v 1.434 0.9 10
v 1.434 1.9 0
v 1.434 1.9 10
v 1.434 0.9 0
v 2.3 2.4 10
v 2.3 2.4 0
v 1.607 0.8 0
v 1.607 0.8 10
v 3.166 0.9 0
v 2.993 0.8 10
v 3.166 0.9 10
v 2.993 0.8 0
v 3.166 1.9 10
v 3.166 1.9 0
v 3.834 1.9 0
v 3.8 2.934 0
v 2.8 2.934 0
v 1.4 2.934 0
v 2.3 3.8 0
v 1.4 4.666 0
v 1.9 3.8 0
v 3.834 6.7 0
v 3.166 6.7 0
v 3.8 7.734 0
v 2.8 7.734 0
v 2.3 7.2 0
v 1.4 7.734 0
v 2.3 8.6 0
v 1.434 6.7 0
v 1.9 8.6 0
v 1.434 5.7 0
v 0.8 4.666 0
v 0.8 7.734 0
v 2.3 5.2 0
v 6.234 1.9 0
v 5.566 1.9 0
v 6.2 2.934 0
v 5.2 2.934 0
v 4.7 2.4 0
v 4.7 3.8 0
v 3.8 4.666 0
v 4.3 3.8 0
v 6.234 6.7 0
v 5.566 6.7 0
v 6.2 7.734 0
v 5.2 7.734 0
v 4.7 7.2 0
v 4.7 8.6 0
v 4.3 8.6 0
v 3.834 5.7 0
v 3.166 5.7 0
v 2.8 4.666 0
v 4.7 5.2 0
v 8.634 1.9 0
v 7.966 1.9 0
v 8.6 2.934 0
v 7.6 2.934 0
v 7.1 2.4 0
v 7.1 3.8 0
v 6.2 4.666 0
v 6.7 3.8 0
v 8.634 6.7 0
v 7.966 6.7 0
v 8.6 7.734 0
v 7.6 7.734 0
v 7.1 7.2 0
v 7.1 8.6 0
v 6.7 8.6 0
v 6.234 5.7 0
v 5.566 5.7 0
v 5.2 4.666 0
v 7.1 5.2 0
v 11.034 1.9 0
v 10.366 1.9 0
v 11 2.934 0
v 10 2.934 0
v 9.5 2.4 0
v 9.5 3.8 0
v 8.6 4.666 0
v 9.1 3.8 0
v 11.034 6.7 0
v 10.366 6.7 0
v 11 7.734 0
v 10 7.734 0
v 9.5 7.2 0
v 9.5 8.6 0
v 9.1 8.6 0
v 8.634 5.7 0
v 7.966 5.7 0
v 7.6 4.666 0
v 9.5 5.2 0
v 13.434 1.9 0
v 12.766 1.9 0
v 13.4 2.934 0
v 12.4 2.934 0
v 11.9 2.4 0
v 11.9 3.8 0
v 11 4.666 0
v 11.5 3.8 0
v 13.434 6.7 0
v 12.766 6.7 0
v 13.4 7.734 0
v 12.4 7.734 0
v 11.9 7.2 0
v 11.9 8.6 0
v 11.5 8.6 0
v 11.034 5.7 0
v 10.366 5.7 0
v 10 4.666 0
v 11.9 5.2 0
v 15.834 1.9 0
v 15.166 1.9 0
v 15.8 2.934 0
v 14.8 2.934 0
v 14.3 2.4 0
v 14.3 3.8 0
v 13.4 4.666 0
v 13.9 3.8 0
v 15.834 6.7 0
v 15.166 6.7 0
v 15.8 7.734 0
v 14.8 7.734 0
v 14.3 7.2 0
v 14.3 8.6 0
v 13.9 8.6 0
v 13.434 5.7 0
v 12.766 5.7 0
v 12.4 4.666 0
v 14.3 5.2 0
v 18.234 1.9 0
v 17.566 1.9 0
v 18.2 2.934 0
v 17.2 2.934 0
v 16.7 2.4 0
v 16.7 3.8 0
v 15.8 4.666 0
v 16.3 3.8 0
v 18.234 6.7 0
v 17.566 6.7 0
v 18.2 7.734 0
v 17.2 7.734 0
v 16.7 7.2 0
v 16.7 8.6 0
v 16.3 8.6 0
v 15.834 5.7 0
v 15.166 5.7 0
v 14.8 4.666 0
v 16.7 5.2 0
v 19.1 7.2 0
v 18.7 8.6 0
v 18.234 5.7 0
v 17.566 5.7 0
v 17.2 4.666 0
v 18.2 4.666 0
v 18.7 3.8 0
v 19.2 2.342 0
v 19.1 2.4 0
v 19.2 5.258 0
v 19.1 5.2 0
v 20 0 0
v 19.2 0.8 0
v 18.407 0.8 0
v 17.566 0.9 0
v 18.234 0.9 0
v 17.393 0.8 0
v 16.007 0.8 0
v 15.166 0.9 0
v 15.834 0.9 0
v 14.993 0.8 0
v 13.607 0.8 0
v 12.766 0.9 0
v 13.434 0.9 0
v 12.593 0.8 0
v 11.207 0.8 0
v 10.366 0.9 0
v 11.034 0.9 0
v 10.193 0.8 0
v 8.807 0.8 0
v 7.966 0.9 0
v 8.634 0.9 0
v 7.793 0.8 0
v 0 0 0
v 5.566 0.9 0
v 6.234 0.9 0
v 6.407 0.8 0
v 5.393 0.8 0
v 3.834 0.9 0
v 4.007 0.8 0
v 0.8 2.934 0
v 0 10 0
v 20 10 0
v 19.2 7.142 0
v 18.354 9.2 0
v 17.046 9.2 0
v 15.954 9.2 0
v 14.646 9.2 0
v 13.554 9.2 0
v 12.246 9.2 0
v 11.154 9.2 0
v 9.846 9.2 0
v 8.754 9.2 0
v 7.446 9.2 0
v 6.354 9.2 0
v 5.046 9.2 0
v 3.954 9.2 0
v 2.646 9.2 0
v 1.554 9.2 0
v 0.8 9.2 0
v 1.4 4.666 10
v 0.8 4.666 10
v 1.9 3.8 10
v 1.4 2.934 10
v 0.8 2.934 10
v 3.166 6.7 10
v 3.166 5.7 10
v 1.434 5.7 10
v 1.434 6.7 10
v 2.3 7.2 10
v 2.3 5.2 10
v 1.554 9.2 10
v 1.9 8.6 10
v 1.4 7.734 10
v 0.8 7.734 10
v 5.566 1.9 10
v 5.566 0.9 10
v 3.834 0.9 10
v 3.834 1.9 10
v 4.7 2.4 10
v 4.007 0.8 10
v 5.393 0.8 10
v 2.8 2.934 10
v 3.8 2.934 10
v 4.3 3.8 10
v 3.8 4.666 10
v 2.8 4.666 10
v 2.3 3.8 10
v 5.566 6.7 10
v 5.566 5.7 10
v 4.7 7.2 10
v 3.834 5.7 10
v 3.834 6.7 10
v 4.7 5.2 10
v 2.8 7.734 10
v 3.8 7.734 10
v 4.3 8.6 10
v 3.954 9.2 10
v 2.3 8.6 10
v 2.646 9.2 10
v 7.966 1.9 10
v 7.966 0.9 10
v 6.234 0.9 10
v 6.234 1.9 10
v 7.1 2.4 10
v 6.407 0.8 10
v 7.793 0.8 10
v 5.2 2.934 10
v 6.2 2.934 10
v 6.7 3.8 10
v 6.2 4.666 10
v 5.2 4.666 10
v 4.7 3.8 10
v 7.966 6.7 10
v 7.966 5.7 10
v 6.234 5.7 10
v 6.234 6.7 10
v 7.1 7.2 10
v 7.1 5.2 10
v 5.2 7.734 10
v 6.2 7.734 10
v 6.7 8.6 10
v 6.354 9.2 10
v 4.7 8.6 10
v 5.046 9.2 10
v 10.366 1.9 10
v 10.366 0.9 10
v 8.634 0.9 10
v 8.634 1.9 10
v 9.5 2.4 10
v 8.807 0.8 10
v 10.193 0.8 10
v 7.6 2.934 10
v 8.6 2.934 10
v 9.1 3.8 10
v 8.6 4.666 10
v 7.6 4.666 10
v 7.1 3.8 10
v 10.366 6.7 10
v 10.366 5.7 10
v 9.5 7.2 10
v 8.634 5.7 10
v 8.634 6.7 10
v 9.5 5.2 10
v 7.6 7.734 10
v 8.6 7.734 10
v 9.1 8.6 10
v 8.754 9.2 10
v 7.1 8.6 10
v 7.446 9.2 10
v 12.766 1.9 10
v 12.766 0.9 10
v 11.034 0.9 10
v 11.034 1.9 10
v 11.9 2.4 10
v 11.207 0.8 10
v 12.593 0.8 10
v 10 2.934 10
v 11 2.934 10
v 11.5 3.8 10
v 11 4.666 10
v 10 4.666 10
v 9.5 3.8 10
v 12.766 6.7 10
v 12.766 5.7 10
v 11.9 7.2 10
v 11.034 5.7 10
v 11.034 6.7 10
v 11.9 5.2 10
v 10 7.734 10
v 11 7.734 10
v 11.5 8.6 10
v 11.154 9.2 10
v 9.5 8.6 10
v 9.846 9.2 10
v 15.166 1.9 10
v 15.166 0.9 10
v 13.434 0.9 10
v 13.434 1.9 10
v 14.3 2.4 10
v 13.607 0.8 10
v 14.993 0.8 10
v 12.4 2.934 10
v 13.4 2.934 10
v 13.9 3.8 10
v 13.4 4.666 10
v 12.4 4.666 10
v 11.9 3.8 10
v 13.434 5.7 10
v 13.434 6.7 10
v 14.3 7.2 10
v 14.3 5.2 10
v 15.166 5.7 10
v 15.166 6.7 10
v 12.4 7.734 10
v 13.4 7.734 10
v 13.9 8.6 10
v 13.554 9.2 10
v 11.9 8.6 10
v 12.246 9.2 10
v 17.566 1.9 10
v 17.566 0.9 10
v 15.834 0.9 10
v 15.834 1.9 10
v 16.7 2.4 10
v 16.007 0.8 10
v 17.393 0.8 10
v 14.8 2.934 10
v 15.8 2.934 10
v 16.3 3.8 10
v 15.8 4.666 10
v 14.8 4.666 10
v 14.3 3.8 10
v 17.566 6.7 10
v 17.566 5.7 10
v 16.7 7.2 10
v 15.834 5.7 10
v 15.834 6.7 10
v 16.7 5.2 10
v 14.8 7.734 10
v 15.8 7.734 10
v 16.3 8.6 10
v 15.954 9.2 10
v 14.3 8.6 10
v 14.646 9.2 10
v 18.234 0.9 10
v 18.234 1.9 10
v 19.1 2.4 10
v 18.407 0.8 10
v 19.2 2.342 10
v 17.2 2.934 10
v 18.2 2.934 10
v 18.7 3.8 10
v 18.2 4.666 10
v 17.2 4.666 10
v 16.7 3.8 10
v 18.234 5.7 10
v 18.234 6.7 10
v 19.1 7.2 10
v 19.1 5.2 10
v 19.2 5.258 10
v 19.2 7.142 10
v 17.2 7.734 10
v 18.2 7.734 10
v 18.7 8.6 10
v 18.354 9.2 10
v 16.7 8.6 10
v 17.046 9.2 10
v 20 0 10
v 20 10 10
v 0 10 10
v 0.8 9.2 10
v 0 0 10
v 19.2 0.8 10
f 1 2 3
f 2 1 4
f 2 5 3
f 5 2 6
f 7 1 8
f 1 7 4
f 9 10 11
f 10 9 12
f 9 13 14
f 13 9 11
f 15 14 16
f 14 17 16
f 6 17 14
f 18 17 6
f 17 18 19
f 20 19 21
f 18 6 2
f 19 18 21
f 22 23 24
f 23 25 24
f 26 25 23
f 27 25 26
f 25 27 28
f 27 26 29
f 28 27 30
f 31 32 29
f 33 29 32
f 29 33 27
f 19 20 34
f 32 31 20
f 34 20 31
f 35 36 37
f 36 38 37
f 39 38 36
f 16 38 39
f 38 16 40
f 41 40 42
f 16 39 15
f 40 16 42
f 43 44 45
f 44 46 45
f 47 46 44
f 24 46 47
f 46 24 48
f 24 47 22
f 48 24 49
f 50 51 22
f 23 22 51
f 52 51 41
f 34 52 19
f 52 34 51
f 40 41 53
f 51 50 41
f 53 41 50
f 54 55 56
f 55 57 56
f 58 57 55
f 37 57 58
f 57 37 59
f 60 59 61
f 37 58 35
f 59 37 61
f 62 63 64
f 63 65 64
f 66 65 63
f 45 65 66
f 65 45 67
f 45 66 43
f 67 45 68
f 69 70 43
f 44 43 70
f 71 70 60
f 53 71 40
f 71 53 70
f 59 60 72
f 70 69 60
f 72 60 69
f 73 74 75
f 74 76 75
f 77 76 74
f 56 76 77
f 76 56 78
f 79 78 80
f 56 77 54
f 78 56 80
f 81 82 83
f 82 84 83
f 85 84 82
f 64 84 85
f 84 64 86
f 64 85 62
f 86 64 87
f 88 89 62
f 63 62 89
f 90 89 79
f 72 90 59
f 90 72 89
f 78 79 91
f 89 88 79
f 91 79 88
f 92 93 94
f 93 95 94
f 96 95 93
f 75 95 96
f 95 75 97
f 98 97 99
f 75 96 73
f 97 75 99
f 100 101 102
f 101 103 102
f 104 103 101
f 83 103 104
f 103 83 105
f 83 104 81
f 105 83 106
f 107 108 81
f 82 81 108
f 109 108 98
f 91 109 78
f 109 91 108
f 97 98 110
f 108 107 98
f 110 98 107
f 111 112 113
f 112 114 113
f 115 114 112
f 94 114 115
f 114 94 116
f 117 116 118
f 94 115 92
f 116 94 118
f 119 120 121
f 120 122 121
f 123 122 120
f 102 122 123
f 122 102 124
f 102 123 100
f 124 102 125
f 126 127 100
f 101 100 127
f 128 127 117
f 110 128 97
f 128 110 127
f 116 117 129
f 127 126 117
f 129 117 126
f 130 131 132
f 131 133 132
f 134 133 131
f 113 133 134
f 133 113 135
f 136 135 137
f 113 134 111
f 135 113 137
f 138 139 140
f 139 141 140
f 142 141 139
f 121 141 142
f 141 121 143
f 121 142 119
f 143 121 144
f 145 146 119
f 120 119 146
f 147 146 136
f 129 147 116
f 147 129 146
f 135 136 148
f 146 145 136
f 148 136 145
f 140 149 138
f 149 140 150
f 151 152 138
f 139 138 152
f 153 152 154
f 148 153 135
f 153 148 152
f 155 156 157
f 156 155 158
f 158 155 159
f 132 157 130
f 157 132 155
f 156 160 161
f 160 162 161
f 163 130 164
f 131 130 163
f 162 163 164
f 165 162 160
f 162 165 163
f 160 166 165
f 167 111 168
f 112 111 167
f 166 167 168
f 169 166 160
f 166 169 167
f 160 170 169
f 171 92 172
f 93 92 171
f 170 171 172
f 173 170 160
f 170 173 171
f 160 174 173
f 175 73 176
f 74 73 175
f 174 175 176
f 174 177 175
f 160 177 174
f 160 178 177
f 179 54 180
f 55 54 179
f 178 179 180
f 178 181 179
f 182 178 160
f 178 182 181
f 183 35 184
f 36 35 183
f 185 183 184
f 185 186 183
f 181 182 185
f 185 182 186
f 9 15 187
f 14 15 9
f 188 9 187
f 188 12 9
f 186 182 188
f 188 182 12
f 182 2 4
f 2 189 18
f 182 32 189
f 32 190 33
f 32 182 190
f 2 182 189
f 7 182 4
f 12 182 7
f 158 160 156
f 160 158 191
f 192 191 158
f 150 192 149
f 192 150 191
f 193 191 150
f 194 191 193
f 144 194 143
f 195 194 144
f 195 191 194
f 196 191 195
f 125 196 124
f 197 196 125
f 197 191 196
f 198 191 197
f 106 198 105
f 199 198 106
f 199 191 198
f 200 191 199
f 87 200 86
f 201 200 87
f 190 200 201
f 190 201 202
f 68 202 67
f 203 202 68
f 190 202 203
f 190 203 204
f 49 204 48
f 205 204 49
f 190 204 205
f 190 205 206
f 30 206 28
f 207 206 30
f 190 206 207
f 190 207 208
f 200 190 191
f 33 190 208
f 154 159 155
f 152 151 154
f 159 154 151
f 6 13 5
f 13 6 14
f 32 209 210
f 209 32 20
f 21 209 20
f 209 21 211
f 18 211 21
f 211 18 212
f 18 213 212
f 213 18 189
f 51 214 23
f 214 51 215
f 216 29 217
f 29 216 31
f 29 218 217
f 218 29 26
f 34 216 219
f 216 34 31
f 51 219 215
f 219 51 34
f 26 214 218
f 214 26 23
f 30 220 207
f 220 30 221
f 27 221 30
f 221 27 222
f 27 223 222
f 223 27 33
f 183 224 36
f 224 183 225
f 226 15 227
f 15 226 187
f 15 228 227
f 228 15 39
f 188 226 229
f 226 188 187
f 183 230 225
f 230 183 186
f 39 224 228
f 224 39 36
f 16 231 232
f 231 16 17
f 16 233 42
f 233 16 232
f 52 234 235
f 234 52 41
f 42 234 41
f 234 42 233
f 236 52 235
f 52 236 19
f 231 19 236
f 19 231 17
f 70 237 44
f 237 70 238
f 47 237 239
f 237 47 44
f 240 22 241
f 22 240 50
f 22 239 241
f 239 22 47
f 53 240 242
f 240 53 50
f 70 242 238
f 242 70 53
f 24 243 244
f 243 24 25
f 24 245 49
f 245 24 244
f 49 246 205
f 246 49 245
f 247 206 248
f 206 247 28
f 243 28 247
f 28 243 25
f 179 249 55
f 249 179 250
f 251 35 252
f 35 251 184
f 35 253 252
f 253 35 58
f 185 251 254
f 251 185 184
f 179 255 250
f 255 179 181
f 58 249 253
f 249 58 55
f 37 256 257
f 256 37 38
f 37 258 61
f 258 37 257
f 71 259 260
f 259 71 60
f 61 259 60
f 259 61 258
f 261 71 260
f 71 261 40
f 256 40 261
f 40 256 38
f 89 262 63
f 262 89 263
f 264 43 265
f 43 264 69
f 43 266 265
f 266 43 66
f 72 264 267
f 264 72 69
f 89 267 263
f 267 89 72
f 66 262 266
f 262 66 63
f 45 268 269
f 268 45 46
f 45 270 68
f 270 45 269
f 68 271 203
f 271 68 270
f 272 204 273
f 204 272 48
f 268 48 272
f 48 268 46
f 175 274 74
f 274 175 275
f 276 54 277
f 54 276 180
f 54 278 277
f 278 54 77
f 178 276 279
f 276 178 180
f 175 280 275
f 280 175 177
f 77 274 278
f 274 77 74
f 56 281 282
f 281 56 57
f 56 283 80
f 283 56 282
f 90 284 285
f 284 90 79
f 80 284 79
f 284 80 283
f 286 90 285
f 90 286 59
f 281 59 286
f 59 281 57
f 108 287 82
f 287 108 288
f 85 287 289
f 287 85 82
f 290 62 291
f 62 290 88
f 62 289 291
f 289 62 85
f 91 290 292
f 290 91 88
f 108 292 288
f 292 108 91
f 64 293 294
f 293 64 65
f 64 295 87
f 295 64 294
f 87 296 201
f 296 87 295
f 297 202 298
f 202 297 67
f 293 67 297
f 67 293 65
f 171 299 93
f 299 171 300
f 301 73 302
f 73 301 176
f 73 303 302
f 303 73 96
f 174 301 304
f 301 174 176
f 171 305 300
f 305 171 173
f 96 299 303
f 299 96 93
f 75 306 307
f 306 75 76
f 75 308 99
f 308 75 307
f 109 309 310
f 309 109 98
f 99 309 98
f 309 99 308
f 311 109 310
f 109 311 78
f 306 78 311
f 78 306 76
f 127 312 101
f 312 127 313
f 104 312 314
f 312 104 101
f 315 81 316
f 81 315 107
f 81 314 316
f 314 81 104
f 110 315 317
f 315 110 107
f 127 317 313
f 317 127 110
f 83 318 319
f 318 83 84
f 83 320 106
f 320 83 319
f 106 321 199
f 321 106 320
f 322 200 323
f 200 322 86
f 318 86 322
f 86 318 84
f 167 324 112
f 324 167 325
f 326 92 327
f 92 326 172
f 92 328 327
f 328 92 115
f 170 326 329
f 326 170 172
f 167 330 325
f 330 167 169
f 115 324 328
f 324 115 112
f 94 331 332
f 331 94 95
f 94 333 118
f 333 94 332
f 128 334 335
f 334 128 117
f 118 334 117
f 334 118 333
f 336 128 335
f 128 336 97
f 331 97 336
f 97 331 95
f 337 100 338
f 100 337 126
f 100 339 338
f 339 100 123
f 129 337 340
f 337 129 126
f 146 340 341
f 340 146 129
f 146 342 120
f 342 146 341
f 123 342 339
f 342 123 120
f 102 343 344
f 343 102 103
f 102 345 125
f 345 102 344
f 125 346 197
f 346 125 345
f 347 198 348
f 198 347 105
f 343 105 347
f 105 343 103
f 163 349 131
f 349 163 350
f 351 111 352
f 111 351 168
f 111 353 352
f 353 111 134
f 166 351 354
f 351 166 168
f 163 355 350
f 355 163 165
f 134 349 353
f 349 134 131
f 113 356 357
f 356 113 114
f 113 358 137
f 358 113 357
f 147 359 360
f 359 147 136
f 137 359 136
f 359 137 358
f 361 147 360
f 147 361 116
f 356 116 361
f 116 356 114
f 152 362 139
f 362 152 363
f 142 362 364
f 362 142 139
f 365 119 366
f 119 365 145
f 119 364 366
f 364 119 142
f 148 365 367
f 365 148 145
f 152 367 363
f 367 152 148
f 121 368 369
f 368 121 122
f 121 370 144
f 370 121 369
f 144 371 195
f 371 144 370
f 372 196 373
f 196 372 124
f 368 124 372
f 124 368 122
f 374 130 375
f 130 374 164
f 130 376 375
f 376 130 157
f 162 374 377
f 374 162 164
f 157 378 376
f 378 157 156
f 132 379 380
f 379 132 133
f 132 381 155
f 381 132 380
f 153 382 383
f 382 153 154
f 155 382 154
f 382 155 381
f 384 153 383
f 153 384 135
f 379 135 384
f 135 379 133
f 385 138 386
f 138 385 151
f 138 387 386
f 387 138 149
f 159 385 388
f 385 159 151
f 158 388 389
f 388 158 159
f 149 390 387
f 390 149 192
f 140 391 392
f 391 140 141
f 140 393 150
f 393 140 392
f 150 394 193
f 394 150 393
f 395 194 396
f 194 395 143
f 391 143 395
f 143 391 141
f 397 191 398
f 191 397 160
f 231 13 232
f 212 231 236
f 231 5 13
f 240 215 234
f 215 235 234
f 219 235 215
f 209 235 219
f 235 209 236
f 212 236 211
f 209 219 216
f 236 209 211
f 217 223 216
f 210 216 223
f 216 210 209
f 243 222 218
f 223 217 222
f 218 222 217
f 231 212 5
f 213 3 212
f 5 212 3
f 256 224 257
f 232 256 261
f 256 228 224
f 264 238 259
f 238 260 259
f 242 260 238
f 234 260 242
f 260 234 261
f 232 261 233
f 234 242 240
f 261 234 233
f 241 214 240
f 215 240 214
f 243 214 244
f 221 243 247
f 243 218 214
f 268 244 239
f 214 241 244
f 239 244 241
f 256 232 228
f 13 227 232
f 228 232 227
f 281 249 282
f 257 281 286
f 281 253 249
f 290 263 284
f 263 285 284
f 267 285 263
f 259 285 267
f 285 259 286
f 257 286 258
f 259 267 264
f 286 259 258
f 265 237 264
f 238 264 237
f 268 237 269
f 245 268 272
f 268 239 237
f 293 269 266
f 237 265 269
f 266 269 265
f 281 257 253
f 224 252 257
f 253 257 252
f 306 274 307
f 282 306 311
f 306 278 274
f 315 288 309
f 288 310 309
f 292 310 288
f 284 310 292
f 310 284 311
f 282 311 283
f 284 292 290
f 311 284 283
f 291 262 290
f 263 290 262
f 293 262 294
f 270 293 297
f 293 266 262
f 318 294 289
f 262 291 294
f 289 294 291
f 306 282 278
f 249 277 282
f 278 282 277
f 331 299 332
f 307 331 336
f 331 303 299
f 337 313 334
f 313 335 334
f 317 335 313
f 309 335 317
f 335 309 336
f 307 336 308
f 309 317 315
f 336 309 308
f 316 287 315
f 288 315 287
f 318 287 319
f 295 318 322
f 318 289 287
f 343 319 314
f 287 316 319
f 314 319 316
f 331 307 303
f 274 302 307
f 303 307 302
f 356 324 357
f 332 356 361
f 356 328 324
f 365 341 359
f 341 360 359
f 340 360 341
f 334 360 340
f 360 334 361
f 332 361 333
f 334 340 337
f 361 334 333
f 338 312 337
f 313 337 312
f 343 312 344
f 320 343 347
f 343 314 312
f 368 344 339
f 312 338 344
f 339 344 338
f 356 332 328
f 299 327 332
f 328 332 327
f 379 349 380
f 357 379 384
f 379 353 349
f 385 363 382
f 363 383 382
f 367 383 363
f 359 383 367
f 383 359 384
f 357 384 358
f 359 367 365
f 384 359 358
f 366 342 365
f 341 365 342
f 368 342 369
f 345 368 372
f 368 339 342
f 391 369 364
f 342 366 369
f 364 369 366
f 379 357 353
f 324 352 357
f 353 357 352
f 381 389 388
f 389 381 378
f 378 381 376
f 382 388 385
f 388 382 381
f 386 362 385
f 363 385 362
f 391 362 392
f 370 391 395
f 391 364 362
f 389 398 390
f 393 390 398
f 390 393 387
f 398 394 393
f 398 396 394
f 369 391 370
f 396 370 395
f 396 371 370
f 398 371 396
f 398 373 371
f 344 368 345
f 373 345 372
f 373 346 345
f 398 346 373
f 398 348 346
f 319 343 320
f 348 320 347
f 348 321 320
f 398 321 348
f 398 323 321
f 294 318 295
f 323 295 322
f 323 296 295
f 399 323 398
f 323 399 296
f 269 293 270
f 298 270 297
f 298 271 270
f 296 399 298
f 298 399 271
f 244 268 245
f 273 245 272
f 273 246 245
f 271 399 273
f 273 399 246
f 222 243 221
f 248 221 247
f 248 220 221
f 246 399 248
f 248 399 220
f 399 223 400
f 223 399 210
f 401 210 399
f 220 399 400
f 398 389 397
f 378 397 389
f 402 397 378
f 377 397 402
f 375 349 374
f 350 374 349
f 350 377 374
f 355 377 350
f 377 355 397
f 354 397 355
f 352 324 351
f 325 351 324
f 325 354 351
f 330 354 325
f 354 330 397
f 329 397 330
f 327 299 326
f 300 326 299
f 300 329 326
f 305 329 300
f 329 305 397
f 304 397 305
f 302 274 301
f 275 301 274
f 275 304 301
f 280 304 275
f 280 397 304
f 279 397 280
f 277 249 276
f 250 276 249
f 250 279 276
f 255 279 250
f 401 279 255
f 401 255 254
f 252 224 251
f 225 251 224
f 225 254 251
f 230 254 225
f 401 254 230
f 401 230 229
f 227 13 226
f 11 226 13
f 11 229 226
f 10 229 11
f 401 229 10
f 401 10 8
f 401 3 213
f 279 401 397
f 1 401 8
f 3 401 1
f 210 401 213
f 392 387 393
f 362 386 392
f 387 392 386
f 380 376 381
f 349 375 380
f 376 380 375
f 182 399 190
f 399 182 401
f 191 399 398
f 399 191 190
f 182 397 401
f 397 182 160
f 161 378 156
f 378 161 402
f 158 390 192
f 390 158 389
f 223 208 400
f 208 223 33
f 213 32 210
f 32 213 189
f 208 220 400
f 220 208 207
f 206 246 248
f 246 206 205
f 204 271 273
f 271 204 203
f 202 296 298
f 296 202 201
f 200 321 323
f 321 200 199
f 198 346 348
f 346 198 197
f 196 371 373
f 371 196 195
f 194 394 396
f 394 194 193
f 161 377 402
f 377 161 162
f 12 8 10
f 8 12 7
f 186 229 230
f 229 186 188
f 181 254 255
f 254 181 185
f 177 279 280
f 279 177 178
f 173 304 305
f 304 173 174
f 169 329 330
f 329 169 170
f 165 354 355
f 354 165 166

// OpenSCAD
module cutOut(x = 1,y = 1,z = 1,r = 1,s = 0.1){
x = x;
y = x;
z = x;
 d = 2 * r;
for (i = [1:x / (d + s)]){
    for (l = [1:y/ (d + s)]){
translate([i * (d + s) - 0.5 + (l % 2 * (r + s)) - 1,l * (d + s) - 1,0])rotate([0,0,l % 2 * 90])cylinder(h = z,r = r,$fn = 6);
}}
}

module lightCube(size = [1,1,1],r = 2){
    s = 0.4;
difference(){
    cube(size);
    translate([0,0,0])cutOut(size[0],size[1],size[2] ,r = 1,s = s);
    
}
difference(){
    cube(size);
    translate([r,r,0])cube([size[0] - (2 * r),size[1] - (2 * r),size[2]]);
}
}

lightCube([20,10,10],0.8);
//cutOut(10,10,10,0.4);
